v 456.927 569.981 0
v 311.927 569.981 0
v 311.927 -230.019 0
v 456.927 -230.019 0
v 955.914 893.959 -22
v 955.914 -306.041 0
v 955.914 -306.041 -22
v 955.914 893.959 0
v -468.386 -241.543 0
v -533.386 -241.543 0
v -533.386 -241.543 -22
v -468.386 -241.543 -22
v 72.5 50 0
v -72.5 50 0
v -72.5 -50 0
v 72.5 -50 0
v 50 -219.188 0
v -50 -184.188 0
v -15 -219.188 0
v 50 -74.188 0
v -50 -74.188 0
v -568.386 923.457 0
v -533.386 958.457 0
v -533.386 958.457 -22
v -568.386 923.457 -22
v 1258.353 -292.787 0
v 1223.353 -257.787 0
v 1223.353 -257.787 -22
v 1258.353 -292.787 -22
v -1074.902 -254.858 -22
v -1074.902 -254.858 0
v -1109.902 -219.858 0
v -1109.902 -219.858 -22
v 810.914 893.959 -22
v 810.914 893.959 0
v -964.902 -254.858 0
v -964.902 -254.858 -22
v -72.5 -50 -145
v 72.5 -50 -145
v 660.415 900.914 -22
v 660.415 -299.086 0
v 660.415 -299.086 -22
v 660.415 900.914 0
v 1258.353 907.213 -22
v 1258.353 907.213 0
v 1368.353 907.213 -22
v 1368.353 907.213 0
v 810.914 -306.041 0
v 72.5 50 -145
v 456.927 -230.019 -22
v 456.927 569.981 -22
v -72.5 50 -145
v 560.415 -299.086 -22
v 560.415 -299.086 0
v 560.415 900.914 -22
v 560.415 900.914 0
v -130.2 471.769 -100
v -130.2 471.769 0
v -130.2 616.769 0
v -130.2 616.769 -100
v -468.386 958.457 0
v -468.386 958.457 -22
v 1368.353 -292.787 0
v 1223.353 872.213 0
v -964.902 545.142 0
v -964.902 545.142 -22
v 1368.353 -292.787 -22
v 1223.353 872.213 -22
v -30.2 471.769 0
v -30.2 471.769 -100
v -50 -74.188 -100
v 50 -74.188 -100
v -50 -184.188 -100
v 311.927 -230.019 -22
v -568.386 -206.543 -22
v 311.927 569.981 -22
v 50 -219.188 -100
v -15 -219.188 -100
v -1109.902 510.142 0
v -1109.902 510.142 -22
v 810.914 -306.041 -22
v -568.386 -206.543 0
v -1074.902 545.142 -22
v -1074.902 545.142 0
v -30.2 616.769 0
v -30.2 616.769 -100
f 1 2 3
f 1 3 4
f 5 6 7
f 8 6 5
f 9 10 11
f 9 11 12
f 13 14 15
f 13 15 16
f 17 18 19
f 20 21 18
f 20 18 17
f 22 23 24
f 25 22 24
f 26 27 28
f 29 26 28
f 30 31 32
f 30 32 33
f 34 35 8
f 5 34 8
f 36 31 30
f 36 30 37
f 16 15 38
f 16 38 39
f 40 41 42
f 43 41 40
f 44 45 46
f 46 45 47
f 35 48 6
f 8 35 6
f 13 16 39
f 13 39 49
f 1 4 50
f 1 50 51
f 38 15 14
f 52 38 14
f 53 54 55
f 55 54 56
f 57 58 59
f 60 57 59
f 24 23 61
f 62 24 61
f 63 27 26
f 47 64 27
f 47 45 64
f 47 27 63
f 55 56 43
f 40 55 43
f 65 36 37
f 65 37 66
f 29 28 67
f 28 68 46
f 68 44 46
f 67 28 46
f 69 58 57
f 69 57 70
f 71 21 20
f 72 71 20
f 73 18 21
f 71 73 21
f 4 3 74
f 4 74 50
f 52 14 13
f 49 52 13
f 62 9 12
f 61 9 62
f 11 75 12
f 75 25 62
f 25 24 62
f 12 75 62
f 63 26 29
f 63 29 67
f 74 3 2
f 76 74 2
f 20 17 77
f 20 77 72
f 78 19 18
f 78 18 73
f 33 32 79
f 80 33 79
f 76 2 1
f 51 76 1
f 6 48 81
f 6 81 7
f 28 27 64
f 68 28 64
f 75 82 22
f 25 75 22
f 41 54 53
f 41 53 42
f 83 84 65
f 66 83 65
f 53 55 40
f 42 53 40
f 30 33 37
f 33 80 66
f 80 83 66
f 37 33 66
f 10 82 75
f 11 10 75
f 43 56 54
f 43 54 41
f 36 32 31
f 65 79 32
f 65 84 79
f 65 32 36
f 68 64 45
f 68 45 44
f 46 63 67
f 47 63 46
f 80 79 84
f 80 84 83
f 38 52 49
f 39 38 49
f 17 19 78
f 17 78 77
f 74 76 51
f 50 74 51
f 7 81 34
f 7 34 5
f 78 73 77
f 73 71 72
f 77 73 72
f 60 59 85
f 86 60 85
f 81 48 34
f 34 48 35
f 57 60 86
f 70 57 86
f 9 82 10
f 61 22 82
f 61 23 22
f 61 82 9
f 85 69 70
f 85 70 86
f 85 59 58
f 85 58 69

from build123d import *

# Parameters (mm, degrees)
F0_W      = 145
F0_H      = 100
F1_DEPTH  = 145
F2_W      = 100
F2_H      = 145
F3_DEPTH  = 100
F4_SIZE   = 35
F5_W      = 100
F5_H      = 1200
F6_DEPTH  = 22
F7_SIZE   = 35
F8_SIZE   = 35
F9_W      = 145
F9_H      = 800
F10_DEPTH = 22
F11_W     = 145
F11_H     = 1200
F12_DEPTH = 22
F13_W     = 145
F13_H     = 1200
F14_DEPTH = 22
F15_SIZE  = 35
F16_W     = 100
F16_H     = 1200
F17_DEPTH = 22
F18_W     = 145
F18_H     = 800
F19_DEPTH = 22
F20_SIZE  = 35
F21_W     = 100
F21_H     = 145
F22_DEPTH = 100


with BuildPart() as f1:
    # F0 (on Top) → F1 (new body)
    with BuildSketch(Plane.XY):
        Rectangle(F0_W, F0_H)
    extrude(amount=-F1_DEPTH)


with BuildPart() as f3:
    # F2 (on Top) → F3 (new body)
    with BuildSketch(Plane.XY):
        with Locations((0, -146.688203)):
            Rectangle(F2_W, F2_H)
    extrude(amount=-F3_DEPTH)

    # F4
    f4_edges = [f3.edges().sort_by_distance(p)[0] for p in [
        (-50, -219.188203, -50),
    ]]
    chamfer(f4_edges, length=F4_SIZE)


with BuildPart() as f6:
    # F5 (on Top) → F6 (new body)
    with BuildSketch(Plane.XY):
        with Locations((-518.386108, 358.45705)):
            Rectangle(F5_W, F5_H)
    extrude(amount=-F6_DEPTH)

    # F7
    f7_edges = [f6.edges().sort_by_distance(p)[0] for p in [
        (-568.386108, -241.54295, -11),
    ]]
    chamfer(f7_edges, length=F7_SIZE)

    # F8
    f8_edges = [f6.edges().sort_by_distance(p)[0] for p in [
        (-568.386108, 958.45705, -11),
    ]]
    chamfer(f8_edges, length=F8_SIZE)


with BuildPart() as f10:
    # F9 (on Top) → F10 (new body)
    with BuildSketch(Plane.XY):
        with Locations((384.427071, 169.981331)):
            Rectangle(F9_W, F9_H)
    extrude(amount=-F10_DEPTH)


with BuildPart() as f12:
    # F11 (on Top) → F12 (new body)
    with BuildSketch(Plane.XY):
        with Locations((883.413509, 293.959216)):
            Rectangle(F11_W, F11_H)
    extrude(amount=-F12_DEPTH)


with BuildPart() as f14:
    # F13 (on Top) → F14 (new body)
    with BuildSketch(Plane.XY):
        with Locations((1295.853376, 307.212517)):
            Rectangle(F13_W, F13_H)
    extrude(amount=-F14_DEPTH)

    # F15
    f15_edges = [f14.edges().sort_by_distance(p)[0] for p in [
        (1223.353376, -292.787483, -11),
        (1223.353376, 907.212517, -11),
    ]]
    chamfer(f15_edges, length=F15_SIZE)


with BuildPart() as f17:
    # F16 (on Top) → F17 (new body)
    with BuildSketch(Plane.XY):
        with Locations((610.41508, 300.914243)):
            Rectangle(F16_W, F16_H)
    extrude(amount=-F17_DEPTH)


with BuildPart() as f19:
    # F18 (on Top) → F19 (new body)
    with BuildSketch(Plane.XY):
        with Locations((-1037.402034, 145.142138)):
            Rectangle(F18_W, F18_H)
    extrude(amount=-F19_DEPTH)

    # F20
    f20_edges = [f19.edges().sort_by_distance(p)[0] for p in [
        (-1109.902034, -254.857862, -11),
        (-1109.902034, 545.142138, -11),
    ]]
    chamfer(f20_edges, length=F20_SIZE)


with BuildPart() as f22:
    # F21 (on Top) → F22 (new body)
    with BuildSketch(Plane.XY):
        with Locations((-80.200352, 544.269443)):
            Rectangle(F21_W, F21_H)
    extrude(amount=-F22_DEPTH)


solid = Compound([f1.part, f3.part, f6.part, f10.part, f12.part, f14.part, f17.part, f19.part, f22.part])
